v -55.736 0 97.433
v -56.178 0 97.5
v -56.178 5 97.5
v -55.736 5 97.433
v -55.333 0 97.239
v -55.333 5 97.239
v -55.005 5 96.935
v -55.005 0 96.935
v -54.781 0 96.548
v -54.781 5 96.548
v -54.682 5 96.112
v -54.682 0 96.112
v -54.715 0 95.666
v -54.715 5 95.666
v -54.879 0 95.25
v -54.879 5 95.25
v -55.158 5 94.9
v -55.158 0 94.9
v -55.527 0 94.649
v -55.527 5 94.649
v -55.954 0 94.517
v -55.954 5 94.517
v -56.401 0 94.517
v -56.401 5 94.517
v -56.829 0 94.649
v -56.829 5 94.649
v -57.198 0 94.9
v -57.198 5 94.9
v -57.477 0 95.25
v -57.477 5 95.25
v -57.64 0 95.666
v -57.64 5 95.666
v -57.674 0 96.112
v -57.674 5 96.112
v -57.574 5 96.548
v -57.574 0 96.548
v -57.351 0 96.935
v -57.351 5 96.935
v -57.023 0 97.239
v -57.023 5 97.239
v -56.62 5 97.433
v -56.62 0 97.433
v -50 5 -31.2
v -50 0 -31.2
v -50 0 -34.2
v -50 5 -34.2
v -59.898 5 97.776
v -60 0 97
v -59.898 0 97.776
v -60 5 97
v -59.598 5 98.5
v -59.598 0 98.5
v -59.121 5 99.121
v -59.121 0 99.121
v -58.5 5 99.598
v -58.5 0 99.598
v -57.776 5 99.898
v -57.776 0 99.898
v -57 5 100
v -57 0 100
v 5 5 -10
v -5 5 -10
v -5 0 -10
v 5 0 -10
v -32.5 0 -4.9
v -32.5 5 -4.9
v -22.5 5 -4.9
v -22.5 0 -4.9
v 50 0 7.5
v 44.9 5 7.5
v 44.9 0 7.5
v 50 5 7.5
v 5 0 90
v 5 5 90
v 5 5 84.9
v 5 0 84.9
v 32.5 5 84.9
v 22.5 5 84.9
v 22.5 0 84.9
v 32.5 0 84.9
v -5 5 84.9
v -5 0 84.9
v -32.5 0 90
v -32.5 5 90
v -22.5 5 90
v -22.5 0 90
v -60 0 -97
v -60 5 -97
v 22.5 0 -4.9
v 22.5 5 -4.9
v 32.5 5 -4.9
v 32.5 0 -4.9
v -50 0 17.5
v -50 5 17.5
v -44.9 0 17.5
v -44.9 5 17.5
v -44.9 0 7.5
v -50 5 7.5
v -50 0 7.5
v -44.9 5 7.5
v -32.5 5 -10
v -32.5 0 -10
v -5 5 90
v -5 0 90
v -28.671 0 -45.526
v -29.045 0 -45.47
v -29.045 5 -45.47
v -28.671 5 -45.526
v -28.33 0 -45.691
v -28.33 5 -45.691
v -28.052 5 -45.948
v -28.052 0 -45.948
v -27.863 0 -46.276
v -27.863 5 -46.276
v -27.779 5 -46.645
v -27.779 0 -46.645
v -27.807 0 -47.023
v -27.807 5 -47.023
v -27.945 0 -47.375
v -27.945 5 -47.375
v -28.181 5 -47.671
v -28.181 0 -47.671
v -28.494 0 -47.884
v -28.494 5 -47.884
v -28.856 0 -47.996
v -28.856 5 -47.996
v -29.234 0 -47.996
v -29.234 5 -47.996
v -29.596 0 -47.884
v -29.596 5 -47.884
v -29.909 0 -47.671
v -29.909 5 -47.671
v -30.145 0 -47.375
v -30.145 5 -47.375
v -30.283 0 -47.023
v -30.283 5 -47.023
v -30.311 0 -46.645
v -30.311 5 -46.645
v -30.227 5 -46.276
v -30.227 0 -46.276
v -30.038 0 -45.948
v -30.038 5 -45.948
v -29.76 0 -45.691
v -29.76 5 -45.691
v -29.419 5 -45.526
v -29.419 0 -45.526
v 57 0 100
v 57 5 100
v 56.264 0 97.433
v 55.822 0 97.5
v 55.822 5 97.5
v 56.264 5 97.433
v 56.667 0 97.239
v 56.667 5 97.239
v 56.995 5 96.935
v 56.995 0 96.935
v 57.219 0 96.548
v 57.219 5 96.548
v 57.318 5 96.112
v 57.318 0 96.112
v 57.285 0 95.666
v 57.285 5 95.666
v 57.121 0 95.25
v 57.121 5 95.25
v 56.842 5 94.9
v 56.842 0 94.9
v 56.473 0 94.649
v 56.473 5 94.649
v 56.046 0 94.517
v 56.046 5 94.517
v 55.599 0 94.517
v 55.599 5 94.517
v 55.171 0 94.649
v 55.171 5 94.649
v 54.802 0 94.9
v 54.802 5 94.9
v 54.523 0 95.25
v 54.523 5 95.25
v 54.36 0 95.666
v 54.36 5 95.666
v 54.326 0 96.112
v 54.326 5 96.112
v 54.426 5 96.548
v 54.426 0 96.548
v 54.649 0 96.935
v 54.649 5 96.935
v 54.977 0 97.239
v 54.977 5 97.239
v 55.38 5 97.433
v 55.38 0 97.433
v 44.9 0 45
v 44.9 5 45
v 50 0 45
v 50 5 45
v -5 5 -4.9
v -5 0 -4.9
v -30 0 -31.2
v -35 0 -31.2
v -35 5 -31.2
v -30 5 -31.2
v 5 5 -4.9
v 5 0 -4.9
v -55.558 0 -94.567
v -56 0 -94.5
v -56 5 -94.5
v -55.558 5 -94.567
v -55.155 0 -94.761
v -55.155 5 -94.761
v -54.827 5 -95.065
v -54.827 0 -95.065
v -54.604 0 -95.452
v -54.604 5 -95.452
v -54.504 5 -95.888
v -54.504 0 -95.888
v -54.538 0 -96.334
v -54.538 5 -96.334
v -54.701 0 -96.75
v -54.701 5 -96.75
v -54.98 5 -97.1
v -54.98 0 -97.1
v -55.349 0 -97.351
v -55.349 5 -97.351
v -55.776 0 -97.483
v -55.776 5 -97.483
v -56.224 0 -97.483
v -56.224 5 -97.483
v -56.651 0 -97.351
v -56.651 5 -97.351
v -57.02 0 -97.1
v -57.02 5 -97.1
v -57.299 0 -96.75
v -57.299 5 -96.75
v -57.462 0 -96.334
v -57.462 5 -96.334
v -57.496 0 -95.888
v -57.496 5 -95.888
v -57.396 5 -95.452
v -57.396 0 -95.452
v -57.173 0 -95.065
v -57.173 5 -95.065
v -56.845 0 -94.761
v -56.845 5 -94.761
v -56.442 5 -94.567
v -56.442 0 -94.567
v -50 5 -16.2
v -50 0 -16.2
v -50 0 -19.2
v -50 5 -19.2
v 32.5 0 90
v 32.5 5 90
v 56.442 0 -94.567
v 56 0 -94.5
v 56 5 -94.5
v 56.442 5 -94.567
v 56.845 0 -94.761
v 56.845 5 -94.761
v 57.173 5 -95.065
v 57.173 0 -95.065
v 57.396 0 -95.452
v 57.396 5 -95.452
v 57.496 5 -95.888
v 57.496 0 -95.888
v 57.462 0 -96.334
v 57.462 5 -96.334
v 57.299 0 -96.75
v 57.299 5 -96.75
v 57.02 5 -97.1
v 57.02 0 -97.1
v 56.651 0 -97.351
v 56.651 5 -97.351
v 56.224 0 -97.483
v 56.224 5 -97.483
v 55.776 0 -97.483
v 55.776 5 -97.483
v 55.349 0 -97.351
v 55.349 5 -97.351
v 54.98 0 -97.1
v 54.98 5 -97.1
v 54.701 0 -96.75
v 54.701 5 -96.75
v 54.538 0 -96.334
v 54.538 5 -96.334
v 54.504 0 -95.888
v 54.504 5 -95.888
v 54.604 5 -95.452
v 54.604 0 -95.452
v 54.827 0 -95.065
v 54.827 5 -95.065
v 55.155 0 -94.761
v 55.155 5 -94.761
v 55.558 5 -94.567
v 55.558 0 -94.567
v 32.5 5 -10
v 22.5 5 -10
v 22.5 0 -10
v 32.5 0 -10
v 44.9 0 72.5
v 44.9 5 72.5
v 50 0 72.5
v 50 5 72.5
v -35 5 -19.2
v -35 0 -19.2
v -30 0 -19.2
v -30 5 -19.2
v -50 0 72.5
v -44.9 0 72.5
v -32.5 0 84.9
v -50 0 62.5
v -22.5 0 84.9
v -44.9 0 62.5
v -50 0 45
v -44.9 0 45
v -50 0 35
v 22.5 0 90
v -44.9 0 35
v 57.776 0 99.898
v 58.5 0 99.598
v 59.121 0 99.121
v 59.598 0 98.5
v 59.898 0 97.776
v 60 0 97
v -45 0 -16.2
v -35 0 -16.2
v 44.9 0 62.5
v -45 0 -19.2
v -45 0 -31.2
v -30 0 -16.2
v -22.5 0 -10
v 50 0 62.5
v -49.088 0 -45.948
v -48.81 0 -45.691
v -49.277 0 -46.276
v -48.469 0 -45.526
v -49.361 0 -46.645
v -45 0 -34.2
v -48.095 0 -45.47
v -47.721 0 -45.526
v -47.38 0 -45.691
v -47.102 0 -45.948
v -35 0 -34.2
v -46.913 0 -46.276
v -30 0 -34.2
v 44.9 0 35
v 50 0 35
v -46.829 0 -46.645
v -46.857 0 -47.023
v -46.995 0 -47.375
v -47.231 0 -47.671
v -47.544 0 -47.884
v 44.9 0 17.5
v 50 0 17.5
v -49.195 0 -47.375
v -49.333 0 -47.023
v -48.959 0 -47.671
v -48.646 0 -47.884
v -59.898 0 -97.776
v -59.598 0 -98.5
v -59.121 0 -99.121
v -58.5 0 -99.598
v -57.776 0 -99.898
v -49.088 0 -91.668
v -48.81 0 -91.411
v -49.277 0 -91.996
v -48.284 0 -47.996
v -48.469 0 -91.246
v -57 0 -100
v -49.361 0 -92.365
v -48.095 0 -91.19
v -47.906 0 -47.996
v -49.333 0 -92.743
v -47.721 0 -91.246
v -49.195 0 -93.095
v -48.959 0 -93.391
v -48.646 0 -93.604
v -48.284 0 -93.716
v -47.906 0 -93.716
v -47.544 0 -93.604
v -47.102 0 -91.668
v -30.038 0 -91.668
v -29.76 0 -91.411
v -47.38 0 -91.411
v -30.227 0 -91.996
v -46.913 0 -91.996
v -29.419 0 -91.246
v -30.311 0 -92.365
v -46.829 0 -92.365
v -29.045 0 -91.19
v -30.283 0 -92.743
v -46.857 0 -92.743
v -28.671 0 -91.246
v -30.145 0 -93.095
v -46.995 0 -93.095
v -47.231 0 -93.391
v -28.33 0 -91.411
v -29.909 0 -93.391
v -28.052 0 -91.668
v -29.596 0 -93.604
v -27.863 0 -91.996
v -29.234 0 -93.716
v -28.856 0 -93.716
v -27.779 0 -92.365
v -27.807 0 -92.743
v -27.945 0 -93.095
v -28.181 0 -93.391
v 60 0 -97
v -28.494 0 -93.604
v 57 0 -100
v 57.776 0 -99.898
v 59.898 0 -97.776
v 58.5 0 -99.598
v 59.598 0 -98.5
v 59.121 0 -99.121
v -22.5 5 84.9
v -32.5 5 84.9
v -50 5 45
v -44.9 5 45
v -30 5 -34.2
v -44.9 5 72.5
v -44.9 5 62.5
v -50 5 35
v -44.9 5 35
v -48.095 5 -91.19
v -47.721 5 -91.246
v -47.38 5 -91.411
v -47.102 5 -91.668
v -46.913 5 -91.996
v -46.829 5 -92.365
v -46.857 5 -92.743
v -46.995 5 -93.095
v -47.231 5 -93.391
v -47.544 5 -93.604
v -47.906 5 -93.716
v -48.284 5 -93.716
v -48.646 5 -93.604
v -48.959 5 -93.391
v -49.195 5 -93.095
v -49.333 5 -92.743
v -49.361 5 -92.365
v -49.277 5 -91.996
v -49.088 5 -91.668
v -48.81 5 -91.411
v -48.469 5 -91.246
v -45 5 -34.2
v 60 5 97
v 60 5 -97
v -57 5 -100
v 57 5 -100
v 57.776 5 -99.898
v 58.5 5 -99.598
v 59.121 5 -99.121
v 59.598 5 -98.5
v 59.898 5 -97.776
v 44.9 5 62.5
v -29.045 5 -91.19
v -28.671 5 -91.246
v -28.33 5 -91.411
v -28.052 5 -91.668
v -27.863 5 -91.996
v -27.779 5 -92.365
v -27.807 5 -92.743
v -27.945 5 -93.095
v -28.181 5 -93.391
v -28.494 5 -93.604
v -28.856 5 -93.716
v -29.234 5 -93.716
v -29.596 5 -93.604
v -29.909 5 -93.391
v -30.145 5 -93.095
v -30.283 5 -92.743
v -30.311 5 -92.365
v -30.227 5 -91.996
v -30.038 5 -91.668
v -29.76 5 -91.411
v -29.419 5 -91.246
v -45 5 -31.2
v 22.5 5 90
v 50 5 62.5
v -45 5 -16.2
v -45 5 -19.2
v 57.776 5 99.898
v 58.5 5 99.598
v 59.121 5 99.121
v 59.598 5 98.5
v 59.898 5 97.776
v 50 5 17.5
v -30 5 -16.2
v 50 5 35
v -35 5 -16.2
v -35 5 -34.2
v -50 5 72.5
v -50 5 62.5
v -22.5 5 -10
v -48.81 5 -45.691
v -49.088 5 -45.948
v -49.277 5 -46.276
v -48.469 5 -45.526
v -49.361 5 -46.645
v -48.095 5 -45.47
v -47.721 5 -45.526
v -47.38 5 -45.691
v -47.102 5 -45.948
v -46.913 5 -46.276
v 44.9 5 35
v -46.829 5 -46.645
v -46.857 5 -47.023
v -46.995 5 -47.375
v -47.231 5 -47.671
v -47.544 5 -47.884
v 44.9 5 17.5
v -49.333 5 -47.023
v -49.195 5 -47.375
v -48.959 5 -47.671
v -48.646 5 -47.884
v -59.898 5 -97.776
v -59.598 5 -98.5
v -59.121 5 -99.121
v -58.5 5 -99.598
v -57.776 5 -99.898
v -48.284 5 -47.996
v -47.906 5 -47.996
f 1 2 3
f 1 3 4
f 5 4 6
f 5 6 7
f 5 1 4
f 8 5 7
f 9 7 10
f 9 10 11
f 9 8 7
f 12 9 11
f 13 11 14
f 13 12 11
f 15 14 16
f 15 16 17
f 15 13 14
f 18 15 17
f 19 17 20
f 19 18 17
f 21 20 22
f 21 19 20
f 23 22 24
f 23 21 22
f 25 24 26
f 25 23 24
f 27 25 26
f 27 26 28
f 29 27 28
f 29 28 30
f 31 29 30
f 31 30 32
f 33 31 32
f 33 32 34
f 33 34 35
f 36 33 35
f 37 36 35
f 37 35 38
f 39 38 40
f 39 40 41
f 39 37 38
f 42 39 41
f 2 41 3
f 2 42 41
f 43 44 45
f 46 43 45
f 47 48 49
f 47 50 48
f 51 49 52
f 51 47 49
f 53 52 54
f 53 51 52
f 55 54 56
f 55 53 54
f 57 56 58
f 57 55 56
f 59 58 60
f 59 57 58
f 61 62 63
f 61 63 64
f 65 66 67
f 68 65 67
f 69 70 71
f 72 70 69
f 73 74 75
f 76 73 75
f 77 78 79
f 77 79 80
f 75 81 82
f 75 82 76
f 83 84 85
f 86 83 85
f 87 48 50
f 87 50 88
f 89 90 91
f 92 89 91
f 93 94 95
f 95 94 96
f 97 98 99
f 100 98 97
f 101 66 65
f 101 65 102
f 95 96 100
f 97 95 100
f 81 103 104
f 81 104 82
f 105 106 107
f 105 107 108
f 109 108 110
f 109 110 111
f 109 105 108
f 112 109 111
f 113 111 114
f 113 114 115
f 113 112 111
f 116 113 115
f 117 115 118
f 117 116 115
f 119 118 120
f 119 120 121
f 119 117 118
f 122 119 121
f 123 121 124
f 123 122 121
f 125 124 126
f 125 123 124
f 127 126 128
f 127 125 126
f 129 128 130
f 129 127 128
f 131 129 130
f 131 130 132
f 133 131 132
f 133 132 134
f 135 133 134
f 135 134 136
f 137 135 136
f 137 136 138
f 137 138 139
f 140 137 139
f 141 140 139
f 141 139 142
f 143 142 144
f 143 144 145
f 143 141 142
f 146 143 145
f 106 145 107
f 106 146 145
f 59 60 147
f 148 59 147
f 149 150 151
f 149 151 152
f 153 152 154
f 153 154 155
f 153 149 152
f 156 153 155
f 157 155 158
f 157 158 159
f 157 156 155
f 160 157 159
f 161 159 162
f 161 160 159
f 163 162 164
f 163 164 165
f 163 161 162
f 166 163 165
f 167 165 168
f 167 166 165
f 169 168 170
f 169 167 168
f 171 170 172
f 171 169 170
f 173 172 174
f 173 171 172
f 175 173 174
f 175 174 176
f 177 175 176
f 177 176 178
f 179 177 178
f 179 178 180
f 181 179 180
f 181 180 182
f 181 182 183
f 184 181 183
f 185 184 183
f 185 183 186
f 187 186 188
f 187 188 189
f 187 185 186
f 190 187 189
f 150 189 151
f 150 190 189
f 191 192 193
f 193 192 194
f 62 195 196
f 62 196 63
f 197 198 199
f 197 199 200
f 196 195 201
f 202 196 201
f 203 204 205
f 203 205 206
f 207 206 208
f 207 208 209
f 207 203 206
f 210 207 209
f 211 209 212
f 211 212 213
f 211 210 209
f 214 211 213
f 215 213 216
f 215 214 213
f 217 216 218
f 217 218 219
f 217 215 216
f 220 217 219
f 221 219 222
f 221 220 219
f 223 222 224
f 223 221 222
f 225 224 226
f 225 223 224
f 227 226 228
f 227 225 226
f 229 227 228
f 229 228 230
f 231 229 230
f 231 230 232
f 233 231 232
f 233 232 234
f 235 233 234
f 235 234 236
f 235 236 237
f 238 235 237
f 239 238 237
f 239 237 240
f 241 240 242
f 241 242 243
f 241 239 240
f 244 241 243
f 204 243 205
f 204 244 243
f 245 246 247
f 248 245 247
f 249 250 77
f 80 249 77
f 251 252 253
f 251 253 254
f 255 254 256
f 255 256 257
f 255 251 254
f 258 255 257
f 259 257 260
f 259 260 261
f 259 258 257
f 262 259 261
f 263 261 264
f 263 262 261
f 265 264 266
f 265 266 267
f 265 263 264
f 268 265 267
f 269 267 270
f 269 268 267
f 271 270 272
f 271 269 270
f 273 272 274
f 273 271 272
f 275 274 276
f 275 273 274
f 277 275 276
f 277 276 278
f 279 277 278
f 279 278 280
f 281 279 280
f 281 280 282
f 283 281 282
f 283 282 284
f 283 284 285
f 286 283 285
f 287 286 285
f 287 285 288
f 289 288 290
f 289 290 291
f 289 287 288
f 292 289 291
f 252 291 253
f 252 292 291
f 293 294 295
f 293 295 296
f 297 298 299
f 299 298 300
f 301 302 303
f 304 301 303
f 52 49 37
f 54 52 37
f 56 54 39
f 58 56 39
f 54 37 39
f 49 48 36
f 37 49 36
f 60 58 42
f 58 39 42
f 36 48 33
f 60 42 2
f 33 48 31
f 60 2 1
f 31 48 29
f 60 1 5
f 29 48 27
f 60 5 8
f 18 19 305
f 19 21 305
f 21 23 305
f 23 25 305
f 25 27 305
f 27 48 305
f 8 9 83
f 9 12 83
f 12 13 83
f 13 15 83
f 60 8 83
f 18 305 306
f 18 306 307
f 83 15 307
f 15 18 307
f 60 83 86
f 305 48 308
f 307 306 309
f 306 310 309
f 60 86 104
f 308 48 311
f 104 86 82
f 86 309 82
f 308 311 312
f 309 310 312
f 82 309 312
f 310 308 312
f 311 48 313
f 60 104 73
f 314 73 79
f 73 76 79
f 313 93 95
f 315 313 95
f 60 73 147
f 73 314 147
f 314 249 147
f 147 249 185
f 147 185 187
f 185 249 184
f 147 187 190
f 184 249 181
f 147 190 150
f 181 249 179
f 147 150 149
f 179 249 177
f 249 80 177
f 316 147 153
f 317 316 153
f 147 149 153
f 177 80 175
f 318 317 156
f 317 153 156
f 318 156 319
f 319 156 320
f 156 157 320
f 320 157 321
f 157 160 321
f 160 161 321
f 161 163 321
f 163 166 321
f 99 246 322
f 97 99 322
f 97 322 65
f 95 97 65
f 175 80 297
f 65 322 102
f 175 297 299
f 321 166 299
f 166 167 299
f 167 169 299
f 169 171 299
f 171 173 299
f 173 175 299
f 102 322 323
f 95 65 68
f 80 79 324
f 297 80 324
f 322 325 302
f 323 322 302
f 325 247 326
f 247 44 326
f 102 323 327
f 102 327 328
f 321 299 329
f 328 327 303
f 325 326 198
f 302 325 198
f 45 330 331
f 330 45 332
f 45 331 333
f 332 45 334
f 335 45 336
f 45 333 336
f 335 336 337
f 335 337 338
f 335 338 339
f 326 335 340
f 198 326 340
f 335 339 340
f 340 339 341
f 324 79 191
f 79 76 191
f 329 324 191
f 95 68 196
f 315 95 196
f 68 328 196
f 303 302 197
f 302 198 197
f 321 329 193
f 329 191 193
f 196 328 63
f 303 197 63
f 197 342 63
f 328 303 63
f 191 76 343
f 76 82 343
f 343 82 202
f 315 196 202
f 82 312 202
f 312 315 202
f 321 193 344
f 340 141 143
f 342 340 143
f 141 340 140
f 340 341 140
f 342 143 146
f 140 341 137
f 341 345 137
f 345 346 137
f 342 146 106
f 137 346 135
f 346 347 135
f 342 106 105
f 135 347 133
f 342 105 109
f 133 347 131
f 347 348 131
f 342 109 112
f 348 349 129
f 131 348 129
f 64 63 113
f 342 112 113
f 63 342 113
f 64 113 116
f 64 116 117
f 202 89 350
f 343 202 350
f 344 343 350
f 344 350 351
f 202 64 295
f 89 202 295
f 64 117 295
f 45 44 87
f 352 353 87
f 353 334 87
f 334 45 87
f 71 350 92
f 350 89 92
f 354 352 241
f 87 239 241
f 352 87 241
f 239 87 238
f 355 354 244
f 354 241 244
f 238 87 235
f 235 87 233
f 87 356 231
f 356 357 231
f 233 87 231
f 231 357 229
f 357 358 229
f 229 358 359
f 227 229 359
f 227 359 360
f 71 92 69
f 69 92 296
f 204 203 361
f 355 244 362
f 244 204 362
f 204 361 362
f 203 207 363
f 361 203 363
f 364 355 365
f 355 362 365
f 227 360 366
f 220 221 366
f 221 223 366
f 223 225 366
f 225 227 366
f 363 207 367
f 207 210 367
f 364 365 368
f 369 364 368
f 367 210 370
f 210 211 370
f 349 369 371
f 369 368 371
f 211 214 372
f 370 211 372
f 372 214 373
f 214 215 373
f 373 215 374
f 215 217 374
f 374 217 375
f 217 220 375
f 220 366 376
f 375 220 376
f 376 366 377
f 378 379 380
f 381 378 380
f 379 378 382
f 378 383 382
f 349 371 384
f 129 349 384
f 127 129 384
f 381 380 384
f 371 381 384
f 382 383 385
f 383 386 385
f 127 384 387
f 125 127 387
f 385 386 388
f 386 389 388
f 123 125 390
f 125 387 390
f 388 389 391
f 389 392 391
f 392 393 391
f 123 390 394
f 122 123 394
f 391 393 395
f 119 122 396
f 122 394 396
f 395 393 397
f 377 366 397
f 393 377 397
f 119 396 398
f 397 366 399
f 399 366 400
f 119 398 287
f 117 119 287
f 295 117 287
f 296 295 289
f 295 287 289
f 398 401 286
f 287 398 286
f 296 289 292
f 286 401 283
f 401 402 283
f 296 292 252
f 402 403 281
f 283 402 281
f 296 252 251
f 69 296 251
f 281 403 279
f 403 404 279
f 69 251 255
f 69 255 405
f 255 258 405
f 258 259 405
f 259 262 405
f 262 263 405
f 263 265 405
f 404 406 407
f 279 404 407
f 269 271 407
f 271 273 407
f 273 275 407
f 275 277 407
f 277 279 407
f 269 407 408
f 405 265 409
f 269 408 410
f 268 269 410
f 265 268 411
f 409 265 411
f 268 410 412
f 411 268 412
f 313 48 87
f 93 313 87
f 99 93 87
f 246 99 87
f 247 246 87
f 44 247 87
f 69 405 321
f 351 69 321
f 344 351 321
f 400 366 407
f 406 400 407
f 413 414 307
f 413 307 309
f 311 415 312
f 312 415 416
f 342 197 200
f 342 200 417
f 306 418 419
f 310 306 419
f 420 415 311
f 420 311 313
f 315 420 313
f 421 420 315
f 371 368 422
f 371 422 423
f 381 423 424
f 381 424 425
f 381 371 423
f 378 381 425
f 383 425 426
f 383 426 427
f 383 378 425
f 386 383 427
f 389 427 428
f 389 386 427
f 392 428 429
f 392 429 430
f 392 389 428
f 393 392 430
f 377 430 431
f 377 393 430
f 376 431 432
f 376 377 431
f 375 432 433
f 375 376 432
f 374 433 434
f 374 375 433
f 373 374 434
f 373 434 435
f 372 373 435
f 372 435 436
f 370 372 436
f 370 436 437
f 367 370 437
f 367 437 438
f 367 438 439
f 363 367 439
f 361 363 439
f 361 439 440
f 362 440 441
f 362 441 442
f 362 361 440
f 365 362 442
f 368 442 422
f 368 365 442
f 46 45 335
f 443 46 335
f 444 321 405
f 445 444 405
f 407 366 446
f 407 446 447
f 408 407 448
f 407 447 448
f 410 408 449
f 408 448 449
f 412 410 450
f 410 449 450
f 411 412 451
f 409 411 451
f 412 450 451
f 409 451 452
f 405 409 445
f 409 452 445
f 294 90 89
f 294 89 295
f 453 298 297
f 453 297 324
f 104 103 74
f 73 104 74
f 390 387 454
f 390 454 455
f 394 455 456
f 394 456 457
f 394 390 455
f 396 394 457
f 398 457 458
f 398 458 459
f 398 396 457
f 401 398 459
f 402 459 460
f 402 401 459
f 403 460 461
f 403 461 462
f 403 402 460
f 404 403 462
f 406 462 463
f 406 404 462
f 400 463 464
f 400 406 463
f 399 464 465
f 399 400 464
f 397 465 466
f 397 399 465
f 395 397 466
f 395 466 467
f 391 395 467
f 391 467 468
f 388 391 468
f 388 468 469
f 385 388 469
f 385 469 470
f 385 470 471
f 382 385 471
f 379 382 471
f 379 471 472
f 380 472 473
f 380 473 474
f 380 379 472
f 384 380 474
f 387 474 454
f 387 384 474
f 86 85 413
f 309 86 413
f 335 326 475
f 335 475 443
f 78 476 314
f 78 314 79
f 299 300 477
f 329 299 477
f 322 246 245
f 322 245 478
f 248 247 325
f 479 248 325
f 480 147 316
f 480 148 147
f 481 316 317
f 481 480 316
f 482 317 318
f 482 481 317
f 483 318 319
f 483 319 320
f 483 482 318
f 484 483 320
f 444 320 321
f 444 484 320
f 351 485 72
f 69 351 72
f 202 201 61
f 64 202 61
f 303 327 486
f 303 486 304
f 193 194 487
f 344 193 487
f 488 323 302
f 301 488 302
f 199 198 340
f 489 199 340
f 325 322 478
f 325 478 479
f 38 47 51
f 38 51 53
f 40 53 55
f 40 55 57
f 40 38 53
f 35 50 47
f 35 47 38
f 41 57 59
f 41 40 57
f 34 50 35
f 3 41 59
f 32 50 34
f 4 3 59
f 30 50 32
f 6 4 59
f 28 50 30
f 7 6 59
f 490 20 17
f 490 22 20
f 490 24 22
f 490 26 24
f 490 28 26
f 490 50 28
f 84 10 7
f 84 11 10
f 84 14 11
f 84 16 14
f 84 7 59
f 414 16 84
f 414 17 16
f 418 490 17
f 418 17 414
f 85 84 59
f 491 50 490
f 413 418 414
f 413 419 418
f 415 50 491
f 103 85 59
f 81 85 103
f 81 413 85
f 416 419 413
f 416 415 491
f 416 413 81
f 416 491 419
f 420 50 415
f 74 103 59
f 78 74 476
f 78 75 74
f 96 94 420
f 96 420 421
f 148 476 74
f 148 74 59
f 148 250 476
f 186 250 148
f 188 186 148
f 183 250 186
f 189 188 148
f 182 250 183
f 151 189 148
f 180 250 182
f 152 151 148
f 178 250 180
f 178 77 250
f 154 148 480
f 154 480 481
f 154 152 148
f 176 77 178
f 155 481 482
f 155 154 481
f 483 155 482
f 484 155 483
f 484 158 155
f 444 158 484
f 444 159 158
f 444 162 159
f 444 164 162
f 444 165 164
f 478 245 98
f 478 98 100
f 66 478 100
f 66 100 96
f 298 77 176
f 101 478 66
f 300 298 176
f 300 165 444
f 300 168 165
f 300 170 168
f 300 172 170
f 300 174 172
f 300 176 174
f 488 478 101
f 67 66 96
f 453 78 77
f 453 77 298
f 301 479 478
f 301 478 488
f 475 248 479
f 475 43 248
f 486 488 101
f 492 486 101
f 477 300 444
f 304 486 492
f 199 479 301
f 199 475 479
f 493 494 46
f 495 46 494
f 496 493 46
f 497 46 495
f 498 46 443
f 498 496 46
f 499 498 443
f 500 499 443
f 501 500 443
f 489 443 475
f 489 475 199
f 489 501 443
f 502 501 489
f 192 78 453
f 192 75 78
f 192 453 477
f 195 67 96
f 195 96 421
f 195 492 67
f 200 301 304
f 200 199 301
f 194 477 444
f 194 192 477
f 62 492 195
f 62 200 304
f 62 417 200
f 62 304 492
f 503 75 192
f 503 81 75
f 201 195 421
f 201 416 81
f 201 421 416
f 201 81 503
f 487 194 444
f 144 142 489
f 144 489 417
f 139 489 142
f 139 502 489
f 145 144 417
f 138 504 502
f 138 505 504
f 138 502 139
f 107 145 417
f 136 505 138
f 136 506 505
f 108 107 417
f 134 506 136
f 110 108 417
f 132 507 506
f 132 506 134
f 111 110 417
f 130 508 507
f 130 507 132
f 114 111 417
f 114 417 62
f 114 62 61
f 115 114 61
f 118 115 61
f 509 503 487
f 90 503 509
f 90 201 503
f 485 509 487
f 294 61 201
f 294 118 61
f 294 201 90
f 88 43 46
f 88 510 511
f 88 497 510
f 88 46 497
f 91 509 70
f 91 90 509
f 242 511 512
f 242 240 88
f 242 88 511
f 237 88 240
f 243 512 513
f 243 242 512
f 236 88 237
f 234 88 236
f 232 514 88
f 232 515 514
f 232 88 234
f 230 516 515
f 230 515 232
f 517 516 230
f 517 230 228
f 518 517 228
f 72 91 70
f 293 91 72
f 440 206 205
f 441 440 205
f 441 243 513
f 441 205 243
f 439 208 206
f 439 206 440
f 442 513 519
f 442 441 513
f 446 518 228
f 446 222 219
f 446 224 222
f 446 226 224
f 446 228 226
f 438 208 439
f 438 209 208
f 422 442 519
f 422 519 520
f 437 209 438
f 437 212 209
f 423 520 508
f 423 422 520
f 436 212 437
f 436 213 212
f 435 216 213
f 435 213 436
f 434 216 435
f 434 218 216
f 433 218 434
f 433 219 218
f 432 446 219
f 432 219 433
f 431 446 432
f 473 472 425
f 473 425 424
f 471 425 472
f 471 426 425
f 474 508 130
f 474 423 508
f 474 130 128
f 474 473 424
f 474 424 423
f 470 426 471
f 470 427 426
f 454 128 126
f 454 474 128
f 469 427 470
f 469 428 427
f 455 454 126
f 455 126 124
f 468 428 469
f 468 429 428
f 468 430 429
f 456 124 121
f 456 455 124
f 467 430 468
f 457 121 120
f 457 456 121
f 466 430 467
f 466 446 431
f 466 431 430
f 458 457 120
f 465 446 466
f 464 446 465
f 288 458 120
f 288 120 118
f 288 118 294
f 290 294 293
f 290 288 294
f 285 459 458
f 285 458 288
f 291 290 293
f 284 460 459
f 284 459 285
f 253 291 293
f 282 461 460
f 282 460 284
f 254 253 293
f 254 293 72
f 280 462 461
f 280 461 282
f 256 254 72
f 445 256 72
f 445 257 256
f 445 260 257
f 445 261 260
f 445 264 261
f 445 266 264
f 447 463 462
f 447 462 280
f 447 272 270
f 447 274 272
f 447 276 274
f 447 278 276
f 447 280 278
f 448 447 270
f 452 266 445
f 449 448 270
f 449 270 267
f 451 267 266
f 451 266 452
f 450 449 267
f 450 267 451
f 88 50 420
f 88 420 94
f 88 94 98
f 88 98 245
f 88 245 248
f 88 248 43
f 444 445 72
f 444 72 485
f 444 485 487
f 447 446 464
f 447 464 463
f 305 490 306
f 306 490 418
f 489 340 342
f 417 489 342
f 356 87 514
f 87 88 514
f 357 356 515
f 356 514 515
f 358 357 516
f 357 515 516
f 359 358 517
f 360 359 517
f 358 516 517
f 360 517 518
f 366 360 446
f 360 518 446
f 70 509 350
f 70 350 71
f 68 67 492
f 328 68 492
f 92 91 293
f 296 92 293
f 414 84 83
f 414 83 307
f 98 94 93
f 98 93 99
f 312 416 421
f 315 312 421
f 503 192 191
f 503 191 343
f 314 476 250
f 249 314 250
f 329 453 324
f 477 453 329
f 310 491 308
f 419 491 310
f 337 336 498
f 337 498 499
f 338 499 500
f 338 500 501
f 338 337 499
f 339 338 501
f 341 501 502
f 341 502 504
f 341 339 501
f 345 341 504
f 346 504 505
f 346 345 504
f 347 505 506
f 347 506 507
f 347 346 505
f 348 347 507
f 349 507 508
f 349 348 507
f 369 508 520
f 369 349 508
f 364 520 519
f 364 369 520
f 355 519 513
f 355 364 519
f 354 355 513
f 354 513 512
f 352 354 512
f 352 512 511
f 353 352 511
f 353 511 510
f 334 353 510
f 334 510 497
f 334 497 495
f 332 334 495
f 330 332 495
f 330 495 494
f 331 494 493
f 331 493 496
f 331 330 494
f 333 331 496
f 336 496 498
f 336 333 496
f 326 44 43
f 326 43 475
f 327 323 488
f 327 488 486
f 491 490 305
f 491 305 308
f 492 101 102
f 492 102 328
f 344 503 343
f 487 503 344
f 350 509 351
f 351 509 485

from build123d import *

# Parameters (mm, degrees)
SKETCH1_W           = 120
SKETCH1_H           = 200
SKETCH1_R           = 1.5
SKETCH1_R_2         = 1.27
SKETCH1_W_2         = 5
SKETCH1_H_2         = 3
BOSS_EXTRUDE1_DEPTH = 5
CUT_EXTRUDE1_REACH  = 118.726
SKETCH4_W           = 5.1
SKETCH4_H           = 10
SKETCH4_W_2         = 10
SKETCH4_H_2         = 5.1
FILLET1_R           = 3


with BuildPart() as part:
    # Sketch1 → Boss-Extrude1 (new body)
    with BuildSketch(Plane(origin=(0, 0, 0), x_dir=(1, 0, 0), z_dir=(0, 1, 0))):
        Rectangle(SKETCH1_W, SKETCH1_H)
        with Locations(Location((-56, 96, 0), (0, 0, 270))):
            Circle(SKETCH1_R, mode=Mode.SUBTRACT)
        with Locations(Location((56, 96, 0), (0, 0, 270))):
            Circle(SKETCH1_R, mode=Mode.SUBTRACT)
        with Locations(Location((55.822222222, -96, 0), (0, 0, 270))):
            Circle(SKETCH1_R, mode=Mode.SUBTRACT)
        with Locations(Location((-56.177777778, -96, 0), (0, 0, 270))):
            Circle(SKETCH1_R, mode=Mode.SUBTRACT)
        with Locations(Location((-48.095, 92.46, 0), (0, 0, 270))):
            Circle(SKETCH1_R_2, mode=Mode.SUBTRACT)
        with Locations(Location((-29.045, 92.46, 0), (0, 0, 270))):
            Circle(SKETCH1_R_2, mode=Mode.SUBTRACT)
        with Locations(Location((-29.045, 46.74, 0), (0, 0, 270))):
            Circle(SKETCH1_R_2, mode=Mode.SUBTRACT)
        with Locations(Location((-48.095, 46.74, 0), (0, 0, 270))):
            Circle(SKETCH1_R_2, mode=Mode.SUBTRACT)
        with Locations((-32.5, 32.7)):
            Rectangle(SKETCH1_W_2, SKETCH1_H_2, mode=Mode.SUBTRACT)
        with Locations((-47.5, 32.7)):
            Rectangle(SKETCH1_W_2, SKETCH1_H_2, mode=Mode.SUBTRACT)
        with Locations((-32.5, 17.7)):
            Rectangle(SKETCH1_W_2, SKETCH1_H_2, mode=Mode.SUBTRACT)
        with Locations((-47.5, 17.7)):
            Rectangle(SKETCH1_W_2, SKETCH1_H_2, mode=Mode.SUBTRACT)
    extrude(amount=BOSS_EXTRUDE1_DEPTH)

    # Sketch4 → Cut-Extrude1 (cut, up to next)
    with BuildSketch(Plane(origin=(0, 5, 0), x_dir=(1, 0, 0), z_dir=(0, 1, 0)), mode=Mode.PRIVATE) as cut_extrude1_sk1:
        with Locations((-47.45, -12.5)):
            Rectangle(SKETCH4_W, SKETCH4_H)
    cut_extrude1_tool1 = extrude(cut_extrude1_sk1.sketch, amount=-CUT_EXTRUDE1_REACH, mode=Mode.PRIVATE) & part.part
    # Sketch4 → Cut-Extrude1 (cut, up to next)
    with BuildSketch(Plane(origin=(0, 5, 0), x_dir=(1, 0, 0), z_dir=(0, 1, 0)), mode=Mode.PRIVATE) as cut_extrude1_sk2:
        with Locations((-47.45, -67.5)):
            Rectangle(SKETCH4_W, SKETCH4_H)
    cut_extrude1_tool2 = extrude(cut_extrude1_sk2.sketch, amount=-CUT_EXTRUDE1_REACH, mode=Mode.PRIVATE) & part.part
    # Sketch4 → Cut-Extrude1 (cut, up to next)
    with BuildSketch(Plane(origin=(0, 5, 0), x_dir=(1, 0, 0), z_dir=(0, 1, 0)), mode=Mode.PRIVATE) as cut_extrude1_sk3:
        with Locations((-47.45, -40)):
            Rectangle(SKETCH4_W, SKETCH4_H)
    cut_extrude1_tool3 = extrude(cut_extrude1_sk3.sketch, amount=-CUT_EXTRUDE1_REACH, mode=Mode.PRIVATE) & part.part
    # Sketch4 → Cut-Extrude1 (cut, up to next)
    with BuildSketch(Plane(origin=(0, 5, 0), x_dir=(1, 0, 0), z_dir=(0, 1, 0)), mode=Mode.PRIVATE) as cut_extrude1_sk4:
        with Locations((-27.5, 7.45)):
            Rectangle(SKETCH4_W_2, SKETCH4_H_2)
    cut_extrude1_tool4 = extrude(cut_extrude1_sk4.sketch, amount=-CUT_EXTRUDE1_REACH, mode=Mode.PRIVATE) & part.part
    # Sketch4 → Cut-Extrude1 (cut, up to next)
    with BuildSketch(Plane(origin=(0, 5, 0), x_dir=(1, 0, 0), z_dir=(0, 1, 0)), mode=Mode.PRIVATE) as cut_extrude1_sk5:
        with Locations((0, 7.45)):
            Rectangle(SKETCH4_W_2, SKETCH4_H_2)
    cut_extrude1_tool5 = extrude(cut_extrude1_sk5.sketch, amount=-CUT_EXTRUDE1_REACH, mode=Mode.PRIVATE) & part.part
    # Sketch4 → Cut-Extrude1 (cut, up to next)
    with BuildSketch(Plane(origin=(0, 5, 0), x_dir=(1, 0, 0), z_dir=(0, 1, 0)), mode=Mode.PRIVATE) as cut_extrude1_sk6:
        with Locations((27.5, 7.45)):
            Rectangle(SKETCH4_W_2, SKETCH4_H_2)
    cut_extrude1_tool6 = extrude(cut_extrude1_sk6.sketch, amount=-CUT_EXTRUDE1_REACH, mode=Mode.PRIVATE) & part.part
    # Sketch4 → Cut-Extrude1 (cut, up to next)
    with BuildSketch(Plane(origin=(0, 5, 0), x_dir=(1, 0, 0), z_dir=(0, 1, 0)), mode=Mode.PRIVATE) as cut_extrude1_sk7:
        with Locations((47.45, -12.5)):
            Rectangle(SKETCH4_W, SKETCH4_H)
    cut_extrude1_tool7 = extrude(cut_extrude1_sk7.sketch, amount=-CUT_EXTRUDE1_REACH, mode=Mode.PRIVATE) & part.part
    # Sketch4 → Cut-Extrude1 (cut, up to next)
    with BuildSketch(Plane(origin=(0, 5, 0), x_dir=(1, 0, 0), z_dir=(0, 1, 0)), mode=Mode.PRIVATE) as cut_extrude1_sk8:
        with Locations((47.45, -40)):
            Rectangle(SKETCH4_W, SKETCH4_H)
    cut_extrude1_tool8 = extrude(cut_extrude1_sk8.sketch, amount=-CUT_EXTRUDE1_REACH, mode=Mode.PRIVATE) & part.part
    # Sketch4 → Cut-Extrude1 (cut, up to next)
    with BuildSketch(Plane(origin=(0, 5, 0), x_dir=(1, 0, 0), z_dir=(0, 1, 0)), mode=Mode.PRIVATE) as cut_extrude1_sk9:
        with Locations((47.45, -67.5)):
            Rectangle(SKETCH4_W, SKETCH4_H)
    cut_extrude1_tool9 = extrude(cut_extrude1_sk9.sketch, amount=-CUT_EXTRUDE1_REACH, mode=Mode.PRIVATE) & part.part
    # Sketch4 → Cut-Extrude1 (cut, up to next)
    with BuildSketch(Plane(origin=(0, 5, 0), x_dir=(1, 0, 0), z_dir=(0, 1, 0)), mode=Mode.PRIVATE) as cut_extrude1_sk10:
        with Locations((0, -87.45)):
            Rectangle(SKETCH4_W_2, SKETCH4_H_2)
    cut_extrude1_tool10 = extrude(cut_extrude1_sk10.sketch, amount=-CUT_EXTRUDE1_REACH, mode=Mode.PRIVATE) & part.part
    # Sketch4 → Cut-Extrude1 (cut, up to next)
    with BuildSketch(Plane(origin=(0, 5, 0), x_dir=(1, 0, 0), z_dir=(0, 1, 0)), mode=Mode.PRIVATE) as cut_extrude1_sk11:
        with Locations((-27.5, -87.45)):
            Rectangle(SKETCH4_W_2, SKETCH4_H_2)
    cut_extrude1_tool11 = extrude(cut_extrude1_sk11.sketch, amount=-CUT_EXTRUDE1_REACH, mode=Mode.PRIVATE) & part.part
    # Sketch4 → Cut-Extrude1 (cut, up to next)
    with BuildSketch(Plane(origin=(0, 5, 0), x_dir=(1, 0, 0), z_dir=(0, 1, 0)), mode=Mode.PRIVATE) as cut_extrude1_sk12:
        with Locations((27.5, -87.45)):
            Rectangle(SKETCH4_W_2, SKETCH4_H_2)
    cut_extrude1_tool12 = extrude(cut_extrude1_sk12.sketch, amount=-CUT_EXTRUDE1_REACH, mode=Mode.PRIVATE) & part.part
    add(cut_extrude1_tool1.solids().sort_by_distance((-47.45, 5, 12.5))[0], mode=Mode.SUBTRACT)
    add(cut_extrude1_tool2.solids().sort_by_distance((-47.45, 5, 67.5))[0], mode=Mode.SUBTRACT)
    add(cut_extrude1_tool3.solids().sort_by_distance((-47.45, 5, 40))[0], mode=Mode.SUBTRACT)
    add(cut_extrude1_tool4.solids().sort_by_distance((-27.5, 5, -7.45))[0], mode=Mode.SUBTRACT)
    add(cut_extrude1_tool5.solids().sort_by_distance((0, 5, -7.45))[0], mode=Mode.SUBTRACT)
    add(cut_extrude1_tool6.solids().sort_by_distance((27.5, 5, -7.45))[0], mode=Mode.SUBTRACT)
    add(cut_extrude1_tool7.solids().sort_by_distance((47.45, 5, 12.5))[0], mode=Mode.SUBTRACT)
    add(cut_extrude1_tool8.solids().sort_by_distance((47.45, 5, 40))[0], mode=Mode.SUBTRACT)
    add(cut_extrude1_tool9.solids().sort_by_distance((47.45, 5, 67.5))[0], mode=Mode.SUBTRACT)
    add(cut_extrude1_tool10.solids().sort_by_distance((0, 5, 87.45))[0], mode=Mode.SUBTRACT)
    add(cut_extrude1_tool11.solids().sort_by_distance((-27.5, 5, 87.45))[0], mode=Mode.SUBTRACT)
    add(cut_extrude1_tool12.solids().sort_by_distance((27.5, 5, 87.45))[0], mode=Mode.SUBTRACT)

    # Fillet1
    fillet1_edges = [part.edges().sort_by_distance(p)[0] for p in [
        (-60, 2.5, 100),
        (-60, 2.5, -100),
        (60, 2.5, -100),
        (60, 2.5, 100),
    ]]
    fillet(fillet1_edges, radius=FILLET1_R)


solid = part.part
